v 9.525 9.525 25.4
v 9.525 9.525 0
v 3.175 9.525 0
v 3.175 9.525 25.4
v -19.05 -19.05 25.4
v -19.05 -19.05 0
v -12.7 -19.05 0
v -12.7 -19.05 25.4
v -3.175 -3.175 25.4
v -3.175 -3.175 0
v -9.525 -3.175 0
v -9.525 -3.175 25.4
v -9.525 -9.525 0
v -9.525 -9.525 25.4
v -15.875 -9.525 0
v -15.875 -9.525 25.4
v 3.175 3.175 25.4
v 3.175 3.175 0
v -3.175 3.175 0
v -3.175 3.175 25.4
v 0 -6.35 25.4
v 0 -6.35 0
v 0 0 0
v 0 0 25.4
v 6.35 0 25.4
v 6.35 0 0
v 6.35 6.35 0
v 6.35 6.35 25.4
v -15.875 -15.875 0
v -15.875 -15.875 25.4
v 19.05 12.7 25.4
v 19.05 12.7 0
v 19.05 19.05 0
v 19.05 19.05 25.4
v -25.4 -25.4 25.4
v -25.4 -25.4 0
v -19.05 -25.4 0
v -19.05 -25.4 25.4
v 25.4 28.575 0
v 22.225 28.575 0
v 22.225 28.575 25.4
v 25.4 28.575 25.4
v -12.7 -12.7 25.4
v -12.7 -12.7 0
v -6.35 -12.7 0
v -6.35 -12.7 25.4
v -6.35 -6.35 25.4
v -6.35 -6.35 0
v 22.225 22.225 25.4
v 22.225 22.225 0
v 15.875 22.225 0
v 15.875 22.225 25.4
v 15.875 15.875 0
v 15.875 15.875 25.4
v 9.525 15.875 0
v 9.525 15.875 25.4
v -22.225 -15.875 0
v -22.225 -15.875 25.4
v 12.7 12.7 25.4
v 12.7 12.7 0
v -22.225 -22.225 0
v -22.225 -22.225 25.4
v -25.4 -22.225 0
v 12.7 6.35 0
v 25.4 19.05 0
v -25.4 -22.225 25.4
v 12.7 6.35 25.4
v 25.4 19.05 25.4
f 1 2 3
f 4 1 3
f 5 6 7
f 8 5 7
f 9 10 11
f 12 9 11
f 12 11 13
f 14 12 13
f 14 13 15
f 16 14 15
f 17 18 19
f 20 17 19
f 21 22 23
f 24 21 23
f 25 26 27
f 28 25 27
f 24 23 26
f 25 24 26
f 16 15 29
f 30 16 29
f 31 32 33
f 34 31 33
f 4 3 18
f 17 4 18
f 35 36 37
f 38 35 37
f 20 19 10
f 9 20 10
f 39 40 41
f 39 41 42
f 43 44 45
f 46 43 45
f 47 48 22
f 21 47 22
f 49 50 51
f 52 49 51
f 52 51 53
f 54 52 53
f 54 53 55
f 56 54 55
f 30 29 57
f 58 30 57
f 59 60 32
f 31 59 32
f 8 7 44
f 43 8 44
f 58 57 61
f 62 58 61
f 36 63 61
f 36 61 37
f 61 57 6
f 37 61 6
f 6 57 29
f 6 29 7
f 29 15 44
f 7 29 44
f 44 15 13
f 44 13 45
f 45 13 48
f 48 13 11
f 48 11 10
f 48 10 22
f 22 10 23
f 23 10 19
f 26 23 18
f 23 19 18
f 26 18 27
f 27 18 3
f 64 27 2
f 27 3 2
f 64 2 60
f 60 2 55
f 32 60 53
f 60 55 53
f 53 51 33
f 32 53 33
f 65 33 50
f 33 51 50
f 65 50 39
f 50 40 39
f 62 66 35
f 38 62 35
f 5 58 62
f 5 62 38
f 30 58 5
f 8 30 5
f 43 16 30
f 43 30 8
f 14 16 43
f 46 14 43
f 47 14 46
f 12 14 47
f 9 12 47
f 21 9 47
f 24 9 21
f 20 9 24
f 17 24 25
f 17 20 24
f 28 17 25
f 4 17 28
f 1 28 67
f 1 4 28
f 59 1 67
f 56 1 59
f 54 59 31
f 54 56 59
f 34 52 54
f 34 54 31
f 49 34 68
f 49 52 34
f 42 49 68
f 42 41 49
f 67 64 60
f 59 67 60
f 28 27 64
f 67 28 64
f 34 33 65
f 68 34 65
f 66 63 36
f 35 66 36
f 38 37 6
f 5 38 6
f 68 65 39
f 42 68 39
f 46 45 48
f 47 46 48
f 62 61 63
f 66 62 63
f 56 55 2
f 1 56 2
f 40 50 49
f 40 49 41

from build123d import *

# Parameters (mm, degrees)
F0_W     = 3.175
F0_H     = 6.35
F1_DEPTH = 25.4


with BuildPart() as f1:
    # F0 (on Top) → F1 (new body)
    with BuildSketch(Plane.XY):
        Polygon((-12.7, -12.7), (-12.7, -9.525), (-15.875, -9.525), (-15.875, -15.875), (-12.7, -15.875), align=None)
        Polygon((-19.05, -19.05), (-19.05, -15.875), (-22.225, -15.875), (-22.225, -22.225), (-19.05, -22.225), align=None)
        Polygon((-12.7, -19.05), (-12.7, -15.875), (-15.875, -15.875), (-19.05, -15.875), (-19.05, -19.05), align=None)
        Polygon((0, -3.175), (0, 0), (0, 3.175), (-3.175, 3.175), (-3.175, -3.175), align=None)
        Polygon((0, -6.35), (0, -3.175), (-3.175, -3.175), (-6.35, -3.175), (-6.35, -6.35), align=None)
        Polygon((-6.35, -6.35), (-6.35, -3.175), (-9.525, -3.175), (-9.525, -9.525), (-6.35, -9.525), align=None)
        Polygon((19.05, 22.225), (19.05, 19.05), (25.4, 19.05), (25.4, 22.225), (22.225, 22.225), align=None)
        Polygon((12.7, 15.875), (12.7, 12.7), (19.05, 12.7), (19.05, 15.875), (15.875, 15.875), align=None)
        Polygon((15.875, 22.225), (15.875, 15.875), (19.05, 15.875), (19.05, 19.05), (19.05, 22.225), align=None)
        Polygon((9.525, 15.875), (9.525, 9.525), (12.7, 9.525), (12.7, 12.7), (12.7, 15.875), align=None)
        Polygon((6.35, 9.525), (6.35, 6.35), (12.7, 6.35), (12.7, 9.525), (9.525, 9.525), align=None)
        Polygon((-6.35, -12.7), (-6.35, -9.525), (-9.525, -9.525), (-12.7, -9.525), (-12.7, -12.7), align=None)
        Polygon((3.175, 3.175), (6.35, 3.175), (6.35, 6.35), (6.35, 9.525), (3.175, 9.525), align=None)
        Polygon((0, 3.175), (0, 0), (6.35, 0), (6.35, 3.175), (3.175, 3.175), align=None)
        Polygon((-19.05, -25.4), (-19.05, -22.225), (-22.225, -22.225), (-25.4, -22.225), (-25.4, -25.4), align=None)
        with Locations((23.8125, 25.4)):
            Rectangle(F0_W, F0_H)
    extrude(amount=F1_DEPTH)


solid = f1.part
